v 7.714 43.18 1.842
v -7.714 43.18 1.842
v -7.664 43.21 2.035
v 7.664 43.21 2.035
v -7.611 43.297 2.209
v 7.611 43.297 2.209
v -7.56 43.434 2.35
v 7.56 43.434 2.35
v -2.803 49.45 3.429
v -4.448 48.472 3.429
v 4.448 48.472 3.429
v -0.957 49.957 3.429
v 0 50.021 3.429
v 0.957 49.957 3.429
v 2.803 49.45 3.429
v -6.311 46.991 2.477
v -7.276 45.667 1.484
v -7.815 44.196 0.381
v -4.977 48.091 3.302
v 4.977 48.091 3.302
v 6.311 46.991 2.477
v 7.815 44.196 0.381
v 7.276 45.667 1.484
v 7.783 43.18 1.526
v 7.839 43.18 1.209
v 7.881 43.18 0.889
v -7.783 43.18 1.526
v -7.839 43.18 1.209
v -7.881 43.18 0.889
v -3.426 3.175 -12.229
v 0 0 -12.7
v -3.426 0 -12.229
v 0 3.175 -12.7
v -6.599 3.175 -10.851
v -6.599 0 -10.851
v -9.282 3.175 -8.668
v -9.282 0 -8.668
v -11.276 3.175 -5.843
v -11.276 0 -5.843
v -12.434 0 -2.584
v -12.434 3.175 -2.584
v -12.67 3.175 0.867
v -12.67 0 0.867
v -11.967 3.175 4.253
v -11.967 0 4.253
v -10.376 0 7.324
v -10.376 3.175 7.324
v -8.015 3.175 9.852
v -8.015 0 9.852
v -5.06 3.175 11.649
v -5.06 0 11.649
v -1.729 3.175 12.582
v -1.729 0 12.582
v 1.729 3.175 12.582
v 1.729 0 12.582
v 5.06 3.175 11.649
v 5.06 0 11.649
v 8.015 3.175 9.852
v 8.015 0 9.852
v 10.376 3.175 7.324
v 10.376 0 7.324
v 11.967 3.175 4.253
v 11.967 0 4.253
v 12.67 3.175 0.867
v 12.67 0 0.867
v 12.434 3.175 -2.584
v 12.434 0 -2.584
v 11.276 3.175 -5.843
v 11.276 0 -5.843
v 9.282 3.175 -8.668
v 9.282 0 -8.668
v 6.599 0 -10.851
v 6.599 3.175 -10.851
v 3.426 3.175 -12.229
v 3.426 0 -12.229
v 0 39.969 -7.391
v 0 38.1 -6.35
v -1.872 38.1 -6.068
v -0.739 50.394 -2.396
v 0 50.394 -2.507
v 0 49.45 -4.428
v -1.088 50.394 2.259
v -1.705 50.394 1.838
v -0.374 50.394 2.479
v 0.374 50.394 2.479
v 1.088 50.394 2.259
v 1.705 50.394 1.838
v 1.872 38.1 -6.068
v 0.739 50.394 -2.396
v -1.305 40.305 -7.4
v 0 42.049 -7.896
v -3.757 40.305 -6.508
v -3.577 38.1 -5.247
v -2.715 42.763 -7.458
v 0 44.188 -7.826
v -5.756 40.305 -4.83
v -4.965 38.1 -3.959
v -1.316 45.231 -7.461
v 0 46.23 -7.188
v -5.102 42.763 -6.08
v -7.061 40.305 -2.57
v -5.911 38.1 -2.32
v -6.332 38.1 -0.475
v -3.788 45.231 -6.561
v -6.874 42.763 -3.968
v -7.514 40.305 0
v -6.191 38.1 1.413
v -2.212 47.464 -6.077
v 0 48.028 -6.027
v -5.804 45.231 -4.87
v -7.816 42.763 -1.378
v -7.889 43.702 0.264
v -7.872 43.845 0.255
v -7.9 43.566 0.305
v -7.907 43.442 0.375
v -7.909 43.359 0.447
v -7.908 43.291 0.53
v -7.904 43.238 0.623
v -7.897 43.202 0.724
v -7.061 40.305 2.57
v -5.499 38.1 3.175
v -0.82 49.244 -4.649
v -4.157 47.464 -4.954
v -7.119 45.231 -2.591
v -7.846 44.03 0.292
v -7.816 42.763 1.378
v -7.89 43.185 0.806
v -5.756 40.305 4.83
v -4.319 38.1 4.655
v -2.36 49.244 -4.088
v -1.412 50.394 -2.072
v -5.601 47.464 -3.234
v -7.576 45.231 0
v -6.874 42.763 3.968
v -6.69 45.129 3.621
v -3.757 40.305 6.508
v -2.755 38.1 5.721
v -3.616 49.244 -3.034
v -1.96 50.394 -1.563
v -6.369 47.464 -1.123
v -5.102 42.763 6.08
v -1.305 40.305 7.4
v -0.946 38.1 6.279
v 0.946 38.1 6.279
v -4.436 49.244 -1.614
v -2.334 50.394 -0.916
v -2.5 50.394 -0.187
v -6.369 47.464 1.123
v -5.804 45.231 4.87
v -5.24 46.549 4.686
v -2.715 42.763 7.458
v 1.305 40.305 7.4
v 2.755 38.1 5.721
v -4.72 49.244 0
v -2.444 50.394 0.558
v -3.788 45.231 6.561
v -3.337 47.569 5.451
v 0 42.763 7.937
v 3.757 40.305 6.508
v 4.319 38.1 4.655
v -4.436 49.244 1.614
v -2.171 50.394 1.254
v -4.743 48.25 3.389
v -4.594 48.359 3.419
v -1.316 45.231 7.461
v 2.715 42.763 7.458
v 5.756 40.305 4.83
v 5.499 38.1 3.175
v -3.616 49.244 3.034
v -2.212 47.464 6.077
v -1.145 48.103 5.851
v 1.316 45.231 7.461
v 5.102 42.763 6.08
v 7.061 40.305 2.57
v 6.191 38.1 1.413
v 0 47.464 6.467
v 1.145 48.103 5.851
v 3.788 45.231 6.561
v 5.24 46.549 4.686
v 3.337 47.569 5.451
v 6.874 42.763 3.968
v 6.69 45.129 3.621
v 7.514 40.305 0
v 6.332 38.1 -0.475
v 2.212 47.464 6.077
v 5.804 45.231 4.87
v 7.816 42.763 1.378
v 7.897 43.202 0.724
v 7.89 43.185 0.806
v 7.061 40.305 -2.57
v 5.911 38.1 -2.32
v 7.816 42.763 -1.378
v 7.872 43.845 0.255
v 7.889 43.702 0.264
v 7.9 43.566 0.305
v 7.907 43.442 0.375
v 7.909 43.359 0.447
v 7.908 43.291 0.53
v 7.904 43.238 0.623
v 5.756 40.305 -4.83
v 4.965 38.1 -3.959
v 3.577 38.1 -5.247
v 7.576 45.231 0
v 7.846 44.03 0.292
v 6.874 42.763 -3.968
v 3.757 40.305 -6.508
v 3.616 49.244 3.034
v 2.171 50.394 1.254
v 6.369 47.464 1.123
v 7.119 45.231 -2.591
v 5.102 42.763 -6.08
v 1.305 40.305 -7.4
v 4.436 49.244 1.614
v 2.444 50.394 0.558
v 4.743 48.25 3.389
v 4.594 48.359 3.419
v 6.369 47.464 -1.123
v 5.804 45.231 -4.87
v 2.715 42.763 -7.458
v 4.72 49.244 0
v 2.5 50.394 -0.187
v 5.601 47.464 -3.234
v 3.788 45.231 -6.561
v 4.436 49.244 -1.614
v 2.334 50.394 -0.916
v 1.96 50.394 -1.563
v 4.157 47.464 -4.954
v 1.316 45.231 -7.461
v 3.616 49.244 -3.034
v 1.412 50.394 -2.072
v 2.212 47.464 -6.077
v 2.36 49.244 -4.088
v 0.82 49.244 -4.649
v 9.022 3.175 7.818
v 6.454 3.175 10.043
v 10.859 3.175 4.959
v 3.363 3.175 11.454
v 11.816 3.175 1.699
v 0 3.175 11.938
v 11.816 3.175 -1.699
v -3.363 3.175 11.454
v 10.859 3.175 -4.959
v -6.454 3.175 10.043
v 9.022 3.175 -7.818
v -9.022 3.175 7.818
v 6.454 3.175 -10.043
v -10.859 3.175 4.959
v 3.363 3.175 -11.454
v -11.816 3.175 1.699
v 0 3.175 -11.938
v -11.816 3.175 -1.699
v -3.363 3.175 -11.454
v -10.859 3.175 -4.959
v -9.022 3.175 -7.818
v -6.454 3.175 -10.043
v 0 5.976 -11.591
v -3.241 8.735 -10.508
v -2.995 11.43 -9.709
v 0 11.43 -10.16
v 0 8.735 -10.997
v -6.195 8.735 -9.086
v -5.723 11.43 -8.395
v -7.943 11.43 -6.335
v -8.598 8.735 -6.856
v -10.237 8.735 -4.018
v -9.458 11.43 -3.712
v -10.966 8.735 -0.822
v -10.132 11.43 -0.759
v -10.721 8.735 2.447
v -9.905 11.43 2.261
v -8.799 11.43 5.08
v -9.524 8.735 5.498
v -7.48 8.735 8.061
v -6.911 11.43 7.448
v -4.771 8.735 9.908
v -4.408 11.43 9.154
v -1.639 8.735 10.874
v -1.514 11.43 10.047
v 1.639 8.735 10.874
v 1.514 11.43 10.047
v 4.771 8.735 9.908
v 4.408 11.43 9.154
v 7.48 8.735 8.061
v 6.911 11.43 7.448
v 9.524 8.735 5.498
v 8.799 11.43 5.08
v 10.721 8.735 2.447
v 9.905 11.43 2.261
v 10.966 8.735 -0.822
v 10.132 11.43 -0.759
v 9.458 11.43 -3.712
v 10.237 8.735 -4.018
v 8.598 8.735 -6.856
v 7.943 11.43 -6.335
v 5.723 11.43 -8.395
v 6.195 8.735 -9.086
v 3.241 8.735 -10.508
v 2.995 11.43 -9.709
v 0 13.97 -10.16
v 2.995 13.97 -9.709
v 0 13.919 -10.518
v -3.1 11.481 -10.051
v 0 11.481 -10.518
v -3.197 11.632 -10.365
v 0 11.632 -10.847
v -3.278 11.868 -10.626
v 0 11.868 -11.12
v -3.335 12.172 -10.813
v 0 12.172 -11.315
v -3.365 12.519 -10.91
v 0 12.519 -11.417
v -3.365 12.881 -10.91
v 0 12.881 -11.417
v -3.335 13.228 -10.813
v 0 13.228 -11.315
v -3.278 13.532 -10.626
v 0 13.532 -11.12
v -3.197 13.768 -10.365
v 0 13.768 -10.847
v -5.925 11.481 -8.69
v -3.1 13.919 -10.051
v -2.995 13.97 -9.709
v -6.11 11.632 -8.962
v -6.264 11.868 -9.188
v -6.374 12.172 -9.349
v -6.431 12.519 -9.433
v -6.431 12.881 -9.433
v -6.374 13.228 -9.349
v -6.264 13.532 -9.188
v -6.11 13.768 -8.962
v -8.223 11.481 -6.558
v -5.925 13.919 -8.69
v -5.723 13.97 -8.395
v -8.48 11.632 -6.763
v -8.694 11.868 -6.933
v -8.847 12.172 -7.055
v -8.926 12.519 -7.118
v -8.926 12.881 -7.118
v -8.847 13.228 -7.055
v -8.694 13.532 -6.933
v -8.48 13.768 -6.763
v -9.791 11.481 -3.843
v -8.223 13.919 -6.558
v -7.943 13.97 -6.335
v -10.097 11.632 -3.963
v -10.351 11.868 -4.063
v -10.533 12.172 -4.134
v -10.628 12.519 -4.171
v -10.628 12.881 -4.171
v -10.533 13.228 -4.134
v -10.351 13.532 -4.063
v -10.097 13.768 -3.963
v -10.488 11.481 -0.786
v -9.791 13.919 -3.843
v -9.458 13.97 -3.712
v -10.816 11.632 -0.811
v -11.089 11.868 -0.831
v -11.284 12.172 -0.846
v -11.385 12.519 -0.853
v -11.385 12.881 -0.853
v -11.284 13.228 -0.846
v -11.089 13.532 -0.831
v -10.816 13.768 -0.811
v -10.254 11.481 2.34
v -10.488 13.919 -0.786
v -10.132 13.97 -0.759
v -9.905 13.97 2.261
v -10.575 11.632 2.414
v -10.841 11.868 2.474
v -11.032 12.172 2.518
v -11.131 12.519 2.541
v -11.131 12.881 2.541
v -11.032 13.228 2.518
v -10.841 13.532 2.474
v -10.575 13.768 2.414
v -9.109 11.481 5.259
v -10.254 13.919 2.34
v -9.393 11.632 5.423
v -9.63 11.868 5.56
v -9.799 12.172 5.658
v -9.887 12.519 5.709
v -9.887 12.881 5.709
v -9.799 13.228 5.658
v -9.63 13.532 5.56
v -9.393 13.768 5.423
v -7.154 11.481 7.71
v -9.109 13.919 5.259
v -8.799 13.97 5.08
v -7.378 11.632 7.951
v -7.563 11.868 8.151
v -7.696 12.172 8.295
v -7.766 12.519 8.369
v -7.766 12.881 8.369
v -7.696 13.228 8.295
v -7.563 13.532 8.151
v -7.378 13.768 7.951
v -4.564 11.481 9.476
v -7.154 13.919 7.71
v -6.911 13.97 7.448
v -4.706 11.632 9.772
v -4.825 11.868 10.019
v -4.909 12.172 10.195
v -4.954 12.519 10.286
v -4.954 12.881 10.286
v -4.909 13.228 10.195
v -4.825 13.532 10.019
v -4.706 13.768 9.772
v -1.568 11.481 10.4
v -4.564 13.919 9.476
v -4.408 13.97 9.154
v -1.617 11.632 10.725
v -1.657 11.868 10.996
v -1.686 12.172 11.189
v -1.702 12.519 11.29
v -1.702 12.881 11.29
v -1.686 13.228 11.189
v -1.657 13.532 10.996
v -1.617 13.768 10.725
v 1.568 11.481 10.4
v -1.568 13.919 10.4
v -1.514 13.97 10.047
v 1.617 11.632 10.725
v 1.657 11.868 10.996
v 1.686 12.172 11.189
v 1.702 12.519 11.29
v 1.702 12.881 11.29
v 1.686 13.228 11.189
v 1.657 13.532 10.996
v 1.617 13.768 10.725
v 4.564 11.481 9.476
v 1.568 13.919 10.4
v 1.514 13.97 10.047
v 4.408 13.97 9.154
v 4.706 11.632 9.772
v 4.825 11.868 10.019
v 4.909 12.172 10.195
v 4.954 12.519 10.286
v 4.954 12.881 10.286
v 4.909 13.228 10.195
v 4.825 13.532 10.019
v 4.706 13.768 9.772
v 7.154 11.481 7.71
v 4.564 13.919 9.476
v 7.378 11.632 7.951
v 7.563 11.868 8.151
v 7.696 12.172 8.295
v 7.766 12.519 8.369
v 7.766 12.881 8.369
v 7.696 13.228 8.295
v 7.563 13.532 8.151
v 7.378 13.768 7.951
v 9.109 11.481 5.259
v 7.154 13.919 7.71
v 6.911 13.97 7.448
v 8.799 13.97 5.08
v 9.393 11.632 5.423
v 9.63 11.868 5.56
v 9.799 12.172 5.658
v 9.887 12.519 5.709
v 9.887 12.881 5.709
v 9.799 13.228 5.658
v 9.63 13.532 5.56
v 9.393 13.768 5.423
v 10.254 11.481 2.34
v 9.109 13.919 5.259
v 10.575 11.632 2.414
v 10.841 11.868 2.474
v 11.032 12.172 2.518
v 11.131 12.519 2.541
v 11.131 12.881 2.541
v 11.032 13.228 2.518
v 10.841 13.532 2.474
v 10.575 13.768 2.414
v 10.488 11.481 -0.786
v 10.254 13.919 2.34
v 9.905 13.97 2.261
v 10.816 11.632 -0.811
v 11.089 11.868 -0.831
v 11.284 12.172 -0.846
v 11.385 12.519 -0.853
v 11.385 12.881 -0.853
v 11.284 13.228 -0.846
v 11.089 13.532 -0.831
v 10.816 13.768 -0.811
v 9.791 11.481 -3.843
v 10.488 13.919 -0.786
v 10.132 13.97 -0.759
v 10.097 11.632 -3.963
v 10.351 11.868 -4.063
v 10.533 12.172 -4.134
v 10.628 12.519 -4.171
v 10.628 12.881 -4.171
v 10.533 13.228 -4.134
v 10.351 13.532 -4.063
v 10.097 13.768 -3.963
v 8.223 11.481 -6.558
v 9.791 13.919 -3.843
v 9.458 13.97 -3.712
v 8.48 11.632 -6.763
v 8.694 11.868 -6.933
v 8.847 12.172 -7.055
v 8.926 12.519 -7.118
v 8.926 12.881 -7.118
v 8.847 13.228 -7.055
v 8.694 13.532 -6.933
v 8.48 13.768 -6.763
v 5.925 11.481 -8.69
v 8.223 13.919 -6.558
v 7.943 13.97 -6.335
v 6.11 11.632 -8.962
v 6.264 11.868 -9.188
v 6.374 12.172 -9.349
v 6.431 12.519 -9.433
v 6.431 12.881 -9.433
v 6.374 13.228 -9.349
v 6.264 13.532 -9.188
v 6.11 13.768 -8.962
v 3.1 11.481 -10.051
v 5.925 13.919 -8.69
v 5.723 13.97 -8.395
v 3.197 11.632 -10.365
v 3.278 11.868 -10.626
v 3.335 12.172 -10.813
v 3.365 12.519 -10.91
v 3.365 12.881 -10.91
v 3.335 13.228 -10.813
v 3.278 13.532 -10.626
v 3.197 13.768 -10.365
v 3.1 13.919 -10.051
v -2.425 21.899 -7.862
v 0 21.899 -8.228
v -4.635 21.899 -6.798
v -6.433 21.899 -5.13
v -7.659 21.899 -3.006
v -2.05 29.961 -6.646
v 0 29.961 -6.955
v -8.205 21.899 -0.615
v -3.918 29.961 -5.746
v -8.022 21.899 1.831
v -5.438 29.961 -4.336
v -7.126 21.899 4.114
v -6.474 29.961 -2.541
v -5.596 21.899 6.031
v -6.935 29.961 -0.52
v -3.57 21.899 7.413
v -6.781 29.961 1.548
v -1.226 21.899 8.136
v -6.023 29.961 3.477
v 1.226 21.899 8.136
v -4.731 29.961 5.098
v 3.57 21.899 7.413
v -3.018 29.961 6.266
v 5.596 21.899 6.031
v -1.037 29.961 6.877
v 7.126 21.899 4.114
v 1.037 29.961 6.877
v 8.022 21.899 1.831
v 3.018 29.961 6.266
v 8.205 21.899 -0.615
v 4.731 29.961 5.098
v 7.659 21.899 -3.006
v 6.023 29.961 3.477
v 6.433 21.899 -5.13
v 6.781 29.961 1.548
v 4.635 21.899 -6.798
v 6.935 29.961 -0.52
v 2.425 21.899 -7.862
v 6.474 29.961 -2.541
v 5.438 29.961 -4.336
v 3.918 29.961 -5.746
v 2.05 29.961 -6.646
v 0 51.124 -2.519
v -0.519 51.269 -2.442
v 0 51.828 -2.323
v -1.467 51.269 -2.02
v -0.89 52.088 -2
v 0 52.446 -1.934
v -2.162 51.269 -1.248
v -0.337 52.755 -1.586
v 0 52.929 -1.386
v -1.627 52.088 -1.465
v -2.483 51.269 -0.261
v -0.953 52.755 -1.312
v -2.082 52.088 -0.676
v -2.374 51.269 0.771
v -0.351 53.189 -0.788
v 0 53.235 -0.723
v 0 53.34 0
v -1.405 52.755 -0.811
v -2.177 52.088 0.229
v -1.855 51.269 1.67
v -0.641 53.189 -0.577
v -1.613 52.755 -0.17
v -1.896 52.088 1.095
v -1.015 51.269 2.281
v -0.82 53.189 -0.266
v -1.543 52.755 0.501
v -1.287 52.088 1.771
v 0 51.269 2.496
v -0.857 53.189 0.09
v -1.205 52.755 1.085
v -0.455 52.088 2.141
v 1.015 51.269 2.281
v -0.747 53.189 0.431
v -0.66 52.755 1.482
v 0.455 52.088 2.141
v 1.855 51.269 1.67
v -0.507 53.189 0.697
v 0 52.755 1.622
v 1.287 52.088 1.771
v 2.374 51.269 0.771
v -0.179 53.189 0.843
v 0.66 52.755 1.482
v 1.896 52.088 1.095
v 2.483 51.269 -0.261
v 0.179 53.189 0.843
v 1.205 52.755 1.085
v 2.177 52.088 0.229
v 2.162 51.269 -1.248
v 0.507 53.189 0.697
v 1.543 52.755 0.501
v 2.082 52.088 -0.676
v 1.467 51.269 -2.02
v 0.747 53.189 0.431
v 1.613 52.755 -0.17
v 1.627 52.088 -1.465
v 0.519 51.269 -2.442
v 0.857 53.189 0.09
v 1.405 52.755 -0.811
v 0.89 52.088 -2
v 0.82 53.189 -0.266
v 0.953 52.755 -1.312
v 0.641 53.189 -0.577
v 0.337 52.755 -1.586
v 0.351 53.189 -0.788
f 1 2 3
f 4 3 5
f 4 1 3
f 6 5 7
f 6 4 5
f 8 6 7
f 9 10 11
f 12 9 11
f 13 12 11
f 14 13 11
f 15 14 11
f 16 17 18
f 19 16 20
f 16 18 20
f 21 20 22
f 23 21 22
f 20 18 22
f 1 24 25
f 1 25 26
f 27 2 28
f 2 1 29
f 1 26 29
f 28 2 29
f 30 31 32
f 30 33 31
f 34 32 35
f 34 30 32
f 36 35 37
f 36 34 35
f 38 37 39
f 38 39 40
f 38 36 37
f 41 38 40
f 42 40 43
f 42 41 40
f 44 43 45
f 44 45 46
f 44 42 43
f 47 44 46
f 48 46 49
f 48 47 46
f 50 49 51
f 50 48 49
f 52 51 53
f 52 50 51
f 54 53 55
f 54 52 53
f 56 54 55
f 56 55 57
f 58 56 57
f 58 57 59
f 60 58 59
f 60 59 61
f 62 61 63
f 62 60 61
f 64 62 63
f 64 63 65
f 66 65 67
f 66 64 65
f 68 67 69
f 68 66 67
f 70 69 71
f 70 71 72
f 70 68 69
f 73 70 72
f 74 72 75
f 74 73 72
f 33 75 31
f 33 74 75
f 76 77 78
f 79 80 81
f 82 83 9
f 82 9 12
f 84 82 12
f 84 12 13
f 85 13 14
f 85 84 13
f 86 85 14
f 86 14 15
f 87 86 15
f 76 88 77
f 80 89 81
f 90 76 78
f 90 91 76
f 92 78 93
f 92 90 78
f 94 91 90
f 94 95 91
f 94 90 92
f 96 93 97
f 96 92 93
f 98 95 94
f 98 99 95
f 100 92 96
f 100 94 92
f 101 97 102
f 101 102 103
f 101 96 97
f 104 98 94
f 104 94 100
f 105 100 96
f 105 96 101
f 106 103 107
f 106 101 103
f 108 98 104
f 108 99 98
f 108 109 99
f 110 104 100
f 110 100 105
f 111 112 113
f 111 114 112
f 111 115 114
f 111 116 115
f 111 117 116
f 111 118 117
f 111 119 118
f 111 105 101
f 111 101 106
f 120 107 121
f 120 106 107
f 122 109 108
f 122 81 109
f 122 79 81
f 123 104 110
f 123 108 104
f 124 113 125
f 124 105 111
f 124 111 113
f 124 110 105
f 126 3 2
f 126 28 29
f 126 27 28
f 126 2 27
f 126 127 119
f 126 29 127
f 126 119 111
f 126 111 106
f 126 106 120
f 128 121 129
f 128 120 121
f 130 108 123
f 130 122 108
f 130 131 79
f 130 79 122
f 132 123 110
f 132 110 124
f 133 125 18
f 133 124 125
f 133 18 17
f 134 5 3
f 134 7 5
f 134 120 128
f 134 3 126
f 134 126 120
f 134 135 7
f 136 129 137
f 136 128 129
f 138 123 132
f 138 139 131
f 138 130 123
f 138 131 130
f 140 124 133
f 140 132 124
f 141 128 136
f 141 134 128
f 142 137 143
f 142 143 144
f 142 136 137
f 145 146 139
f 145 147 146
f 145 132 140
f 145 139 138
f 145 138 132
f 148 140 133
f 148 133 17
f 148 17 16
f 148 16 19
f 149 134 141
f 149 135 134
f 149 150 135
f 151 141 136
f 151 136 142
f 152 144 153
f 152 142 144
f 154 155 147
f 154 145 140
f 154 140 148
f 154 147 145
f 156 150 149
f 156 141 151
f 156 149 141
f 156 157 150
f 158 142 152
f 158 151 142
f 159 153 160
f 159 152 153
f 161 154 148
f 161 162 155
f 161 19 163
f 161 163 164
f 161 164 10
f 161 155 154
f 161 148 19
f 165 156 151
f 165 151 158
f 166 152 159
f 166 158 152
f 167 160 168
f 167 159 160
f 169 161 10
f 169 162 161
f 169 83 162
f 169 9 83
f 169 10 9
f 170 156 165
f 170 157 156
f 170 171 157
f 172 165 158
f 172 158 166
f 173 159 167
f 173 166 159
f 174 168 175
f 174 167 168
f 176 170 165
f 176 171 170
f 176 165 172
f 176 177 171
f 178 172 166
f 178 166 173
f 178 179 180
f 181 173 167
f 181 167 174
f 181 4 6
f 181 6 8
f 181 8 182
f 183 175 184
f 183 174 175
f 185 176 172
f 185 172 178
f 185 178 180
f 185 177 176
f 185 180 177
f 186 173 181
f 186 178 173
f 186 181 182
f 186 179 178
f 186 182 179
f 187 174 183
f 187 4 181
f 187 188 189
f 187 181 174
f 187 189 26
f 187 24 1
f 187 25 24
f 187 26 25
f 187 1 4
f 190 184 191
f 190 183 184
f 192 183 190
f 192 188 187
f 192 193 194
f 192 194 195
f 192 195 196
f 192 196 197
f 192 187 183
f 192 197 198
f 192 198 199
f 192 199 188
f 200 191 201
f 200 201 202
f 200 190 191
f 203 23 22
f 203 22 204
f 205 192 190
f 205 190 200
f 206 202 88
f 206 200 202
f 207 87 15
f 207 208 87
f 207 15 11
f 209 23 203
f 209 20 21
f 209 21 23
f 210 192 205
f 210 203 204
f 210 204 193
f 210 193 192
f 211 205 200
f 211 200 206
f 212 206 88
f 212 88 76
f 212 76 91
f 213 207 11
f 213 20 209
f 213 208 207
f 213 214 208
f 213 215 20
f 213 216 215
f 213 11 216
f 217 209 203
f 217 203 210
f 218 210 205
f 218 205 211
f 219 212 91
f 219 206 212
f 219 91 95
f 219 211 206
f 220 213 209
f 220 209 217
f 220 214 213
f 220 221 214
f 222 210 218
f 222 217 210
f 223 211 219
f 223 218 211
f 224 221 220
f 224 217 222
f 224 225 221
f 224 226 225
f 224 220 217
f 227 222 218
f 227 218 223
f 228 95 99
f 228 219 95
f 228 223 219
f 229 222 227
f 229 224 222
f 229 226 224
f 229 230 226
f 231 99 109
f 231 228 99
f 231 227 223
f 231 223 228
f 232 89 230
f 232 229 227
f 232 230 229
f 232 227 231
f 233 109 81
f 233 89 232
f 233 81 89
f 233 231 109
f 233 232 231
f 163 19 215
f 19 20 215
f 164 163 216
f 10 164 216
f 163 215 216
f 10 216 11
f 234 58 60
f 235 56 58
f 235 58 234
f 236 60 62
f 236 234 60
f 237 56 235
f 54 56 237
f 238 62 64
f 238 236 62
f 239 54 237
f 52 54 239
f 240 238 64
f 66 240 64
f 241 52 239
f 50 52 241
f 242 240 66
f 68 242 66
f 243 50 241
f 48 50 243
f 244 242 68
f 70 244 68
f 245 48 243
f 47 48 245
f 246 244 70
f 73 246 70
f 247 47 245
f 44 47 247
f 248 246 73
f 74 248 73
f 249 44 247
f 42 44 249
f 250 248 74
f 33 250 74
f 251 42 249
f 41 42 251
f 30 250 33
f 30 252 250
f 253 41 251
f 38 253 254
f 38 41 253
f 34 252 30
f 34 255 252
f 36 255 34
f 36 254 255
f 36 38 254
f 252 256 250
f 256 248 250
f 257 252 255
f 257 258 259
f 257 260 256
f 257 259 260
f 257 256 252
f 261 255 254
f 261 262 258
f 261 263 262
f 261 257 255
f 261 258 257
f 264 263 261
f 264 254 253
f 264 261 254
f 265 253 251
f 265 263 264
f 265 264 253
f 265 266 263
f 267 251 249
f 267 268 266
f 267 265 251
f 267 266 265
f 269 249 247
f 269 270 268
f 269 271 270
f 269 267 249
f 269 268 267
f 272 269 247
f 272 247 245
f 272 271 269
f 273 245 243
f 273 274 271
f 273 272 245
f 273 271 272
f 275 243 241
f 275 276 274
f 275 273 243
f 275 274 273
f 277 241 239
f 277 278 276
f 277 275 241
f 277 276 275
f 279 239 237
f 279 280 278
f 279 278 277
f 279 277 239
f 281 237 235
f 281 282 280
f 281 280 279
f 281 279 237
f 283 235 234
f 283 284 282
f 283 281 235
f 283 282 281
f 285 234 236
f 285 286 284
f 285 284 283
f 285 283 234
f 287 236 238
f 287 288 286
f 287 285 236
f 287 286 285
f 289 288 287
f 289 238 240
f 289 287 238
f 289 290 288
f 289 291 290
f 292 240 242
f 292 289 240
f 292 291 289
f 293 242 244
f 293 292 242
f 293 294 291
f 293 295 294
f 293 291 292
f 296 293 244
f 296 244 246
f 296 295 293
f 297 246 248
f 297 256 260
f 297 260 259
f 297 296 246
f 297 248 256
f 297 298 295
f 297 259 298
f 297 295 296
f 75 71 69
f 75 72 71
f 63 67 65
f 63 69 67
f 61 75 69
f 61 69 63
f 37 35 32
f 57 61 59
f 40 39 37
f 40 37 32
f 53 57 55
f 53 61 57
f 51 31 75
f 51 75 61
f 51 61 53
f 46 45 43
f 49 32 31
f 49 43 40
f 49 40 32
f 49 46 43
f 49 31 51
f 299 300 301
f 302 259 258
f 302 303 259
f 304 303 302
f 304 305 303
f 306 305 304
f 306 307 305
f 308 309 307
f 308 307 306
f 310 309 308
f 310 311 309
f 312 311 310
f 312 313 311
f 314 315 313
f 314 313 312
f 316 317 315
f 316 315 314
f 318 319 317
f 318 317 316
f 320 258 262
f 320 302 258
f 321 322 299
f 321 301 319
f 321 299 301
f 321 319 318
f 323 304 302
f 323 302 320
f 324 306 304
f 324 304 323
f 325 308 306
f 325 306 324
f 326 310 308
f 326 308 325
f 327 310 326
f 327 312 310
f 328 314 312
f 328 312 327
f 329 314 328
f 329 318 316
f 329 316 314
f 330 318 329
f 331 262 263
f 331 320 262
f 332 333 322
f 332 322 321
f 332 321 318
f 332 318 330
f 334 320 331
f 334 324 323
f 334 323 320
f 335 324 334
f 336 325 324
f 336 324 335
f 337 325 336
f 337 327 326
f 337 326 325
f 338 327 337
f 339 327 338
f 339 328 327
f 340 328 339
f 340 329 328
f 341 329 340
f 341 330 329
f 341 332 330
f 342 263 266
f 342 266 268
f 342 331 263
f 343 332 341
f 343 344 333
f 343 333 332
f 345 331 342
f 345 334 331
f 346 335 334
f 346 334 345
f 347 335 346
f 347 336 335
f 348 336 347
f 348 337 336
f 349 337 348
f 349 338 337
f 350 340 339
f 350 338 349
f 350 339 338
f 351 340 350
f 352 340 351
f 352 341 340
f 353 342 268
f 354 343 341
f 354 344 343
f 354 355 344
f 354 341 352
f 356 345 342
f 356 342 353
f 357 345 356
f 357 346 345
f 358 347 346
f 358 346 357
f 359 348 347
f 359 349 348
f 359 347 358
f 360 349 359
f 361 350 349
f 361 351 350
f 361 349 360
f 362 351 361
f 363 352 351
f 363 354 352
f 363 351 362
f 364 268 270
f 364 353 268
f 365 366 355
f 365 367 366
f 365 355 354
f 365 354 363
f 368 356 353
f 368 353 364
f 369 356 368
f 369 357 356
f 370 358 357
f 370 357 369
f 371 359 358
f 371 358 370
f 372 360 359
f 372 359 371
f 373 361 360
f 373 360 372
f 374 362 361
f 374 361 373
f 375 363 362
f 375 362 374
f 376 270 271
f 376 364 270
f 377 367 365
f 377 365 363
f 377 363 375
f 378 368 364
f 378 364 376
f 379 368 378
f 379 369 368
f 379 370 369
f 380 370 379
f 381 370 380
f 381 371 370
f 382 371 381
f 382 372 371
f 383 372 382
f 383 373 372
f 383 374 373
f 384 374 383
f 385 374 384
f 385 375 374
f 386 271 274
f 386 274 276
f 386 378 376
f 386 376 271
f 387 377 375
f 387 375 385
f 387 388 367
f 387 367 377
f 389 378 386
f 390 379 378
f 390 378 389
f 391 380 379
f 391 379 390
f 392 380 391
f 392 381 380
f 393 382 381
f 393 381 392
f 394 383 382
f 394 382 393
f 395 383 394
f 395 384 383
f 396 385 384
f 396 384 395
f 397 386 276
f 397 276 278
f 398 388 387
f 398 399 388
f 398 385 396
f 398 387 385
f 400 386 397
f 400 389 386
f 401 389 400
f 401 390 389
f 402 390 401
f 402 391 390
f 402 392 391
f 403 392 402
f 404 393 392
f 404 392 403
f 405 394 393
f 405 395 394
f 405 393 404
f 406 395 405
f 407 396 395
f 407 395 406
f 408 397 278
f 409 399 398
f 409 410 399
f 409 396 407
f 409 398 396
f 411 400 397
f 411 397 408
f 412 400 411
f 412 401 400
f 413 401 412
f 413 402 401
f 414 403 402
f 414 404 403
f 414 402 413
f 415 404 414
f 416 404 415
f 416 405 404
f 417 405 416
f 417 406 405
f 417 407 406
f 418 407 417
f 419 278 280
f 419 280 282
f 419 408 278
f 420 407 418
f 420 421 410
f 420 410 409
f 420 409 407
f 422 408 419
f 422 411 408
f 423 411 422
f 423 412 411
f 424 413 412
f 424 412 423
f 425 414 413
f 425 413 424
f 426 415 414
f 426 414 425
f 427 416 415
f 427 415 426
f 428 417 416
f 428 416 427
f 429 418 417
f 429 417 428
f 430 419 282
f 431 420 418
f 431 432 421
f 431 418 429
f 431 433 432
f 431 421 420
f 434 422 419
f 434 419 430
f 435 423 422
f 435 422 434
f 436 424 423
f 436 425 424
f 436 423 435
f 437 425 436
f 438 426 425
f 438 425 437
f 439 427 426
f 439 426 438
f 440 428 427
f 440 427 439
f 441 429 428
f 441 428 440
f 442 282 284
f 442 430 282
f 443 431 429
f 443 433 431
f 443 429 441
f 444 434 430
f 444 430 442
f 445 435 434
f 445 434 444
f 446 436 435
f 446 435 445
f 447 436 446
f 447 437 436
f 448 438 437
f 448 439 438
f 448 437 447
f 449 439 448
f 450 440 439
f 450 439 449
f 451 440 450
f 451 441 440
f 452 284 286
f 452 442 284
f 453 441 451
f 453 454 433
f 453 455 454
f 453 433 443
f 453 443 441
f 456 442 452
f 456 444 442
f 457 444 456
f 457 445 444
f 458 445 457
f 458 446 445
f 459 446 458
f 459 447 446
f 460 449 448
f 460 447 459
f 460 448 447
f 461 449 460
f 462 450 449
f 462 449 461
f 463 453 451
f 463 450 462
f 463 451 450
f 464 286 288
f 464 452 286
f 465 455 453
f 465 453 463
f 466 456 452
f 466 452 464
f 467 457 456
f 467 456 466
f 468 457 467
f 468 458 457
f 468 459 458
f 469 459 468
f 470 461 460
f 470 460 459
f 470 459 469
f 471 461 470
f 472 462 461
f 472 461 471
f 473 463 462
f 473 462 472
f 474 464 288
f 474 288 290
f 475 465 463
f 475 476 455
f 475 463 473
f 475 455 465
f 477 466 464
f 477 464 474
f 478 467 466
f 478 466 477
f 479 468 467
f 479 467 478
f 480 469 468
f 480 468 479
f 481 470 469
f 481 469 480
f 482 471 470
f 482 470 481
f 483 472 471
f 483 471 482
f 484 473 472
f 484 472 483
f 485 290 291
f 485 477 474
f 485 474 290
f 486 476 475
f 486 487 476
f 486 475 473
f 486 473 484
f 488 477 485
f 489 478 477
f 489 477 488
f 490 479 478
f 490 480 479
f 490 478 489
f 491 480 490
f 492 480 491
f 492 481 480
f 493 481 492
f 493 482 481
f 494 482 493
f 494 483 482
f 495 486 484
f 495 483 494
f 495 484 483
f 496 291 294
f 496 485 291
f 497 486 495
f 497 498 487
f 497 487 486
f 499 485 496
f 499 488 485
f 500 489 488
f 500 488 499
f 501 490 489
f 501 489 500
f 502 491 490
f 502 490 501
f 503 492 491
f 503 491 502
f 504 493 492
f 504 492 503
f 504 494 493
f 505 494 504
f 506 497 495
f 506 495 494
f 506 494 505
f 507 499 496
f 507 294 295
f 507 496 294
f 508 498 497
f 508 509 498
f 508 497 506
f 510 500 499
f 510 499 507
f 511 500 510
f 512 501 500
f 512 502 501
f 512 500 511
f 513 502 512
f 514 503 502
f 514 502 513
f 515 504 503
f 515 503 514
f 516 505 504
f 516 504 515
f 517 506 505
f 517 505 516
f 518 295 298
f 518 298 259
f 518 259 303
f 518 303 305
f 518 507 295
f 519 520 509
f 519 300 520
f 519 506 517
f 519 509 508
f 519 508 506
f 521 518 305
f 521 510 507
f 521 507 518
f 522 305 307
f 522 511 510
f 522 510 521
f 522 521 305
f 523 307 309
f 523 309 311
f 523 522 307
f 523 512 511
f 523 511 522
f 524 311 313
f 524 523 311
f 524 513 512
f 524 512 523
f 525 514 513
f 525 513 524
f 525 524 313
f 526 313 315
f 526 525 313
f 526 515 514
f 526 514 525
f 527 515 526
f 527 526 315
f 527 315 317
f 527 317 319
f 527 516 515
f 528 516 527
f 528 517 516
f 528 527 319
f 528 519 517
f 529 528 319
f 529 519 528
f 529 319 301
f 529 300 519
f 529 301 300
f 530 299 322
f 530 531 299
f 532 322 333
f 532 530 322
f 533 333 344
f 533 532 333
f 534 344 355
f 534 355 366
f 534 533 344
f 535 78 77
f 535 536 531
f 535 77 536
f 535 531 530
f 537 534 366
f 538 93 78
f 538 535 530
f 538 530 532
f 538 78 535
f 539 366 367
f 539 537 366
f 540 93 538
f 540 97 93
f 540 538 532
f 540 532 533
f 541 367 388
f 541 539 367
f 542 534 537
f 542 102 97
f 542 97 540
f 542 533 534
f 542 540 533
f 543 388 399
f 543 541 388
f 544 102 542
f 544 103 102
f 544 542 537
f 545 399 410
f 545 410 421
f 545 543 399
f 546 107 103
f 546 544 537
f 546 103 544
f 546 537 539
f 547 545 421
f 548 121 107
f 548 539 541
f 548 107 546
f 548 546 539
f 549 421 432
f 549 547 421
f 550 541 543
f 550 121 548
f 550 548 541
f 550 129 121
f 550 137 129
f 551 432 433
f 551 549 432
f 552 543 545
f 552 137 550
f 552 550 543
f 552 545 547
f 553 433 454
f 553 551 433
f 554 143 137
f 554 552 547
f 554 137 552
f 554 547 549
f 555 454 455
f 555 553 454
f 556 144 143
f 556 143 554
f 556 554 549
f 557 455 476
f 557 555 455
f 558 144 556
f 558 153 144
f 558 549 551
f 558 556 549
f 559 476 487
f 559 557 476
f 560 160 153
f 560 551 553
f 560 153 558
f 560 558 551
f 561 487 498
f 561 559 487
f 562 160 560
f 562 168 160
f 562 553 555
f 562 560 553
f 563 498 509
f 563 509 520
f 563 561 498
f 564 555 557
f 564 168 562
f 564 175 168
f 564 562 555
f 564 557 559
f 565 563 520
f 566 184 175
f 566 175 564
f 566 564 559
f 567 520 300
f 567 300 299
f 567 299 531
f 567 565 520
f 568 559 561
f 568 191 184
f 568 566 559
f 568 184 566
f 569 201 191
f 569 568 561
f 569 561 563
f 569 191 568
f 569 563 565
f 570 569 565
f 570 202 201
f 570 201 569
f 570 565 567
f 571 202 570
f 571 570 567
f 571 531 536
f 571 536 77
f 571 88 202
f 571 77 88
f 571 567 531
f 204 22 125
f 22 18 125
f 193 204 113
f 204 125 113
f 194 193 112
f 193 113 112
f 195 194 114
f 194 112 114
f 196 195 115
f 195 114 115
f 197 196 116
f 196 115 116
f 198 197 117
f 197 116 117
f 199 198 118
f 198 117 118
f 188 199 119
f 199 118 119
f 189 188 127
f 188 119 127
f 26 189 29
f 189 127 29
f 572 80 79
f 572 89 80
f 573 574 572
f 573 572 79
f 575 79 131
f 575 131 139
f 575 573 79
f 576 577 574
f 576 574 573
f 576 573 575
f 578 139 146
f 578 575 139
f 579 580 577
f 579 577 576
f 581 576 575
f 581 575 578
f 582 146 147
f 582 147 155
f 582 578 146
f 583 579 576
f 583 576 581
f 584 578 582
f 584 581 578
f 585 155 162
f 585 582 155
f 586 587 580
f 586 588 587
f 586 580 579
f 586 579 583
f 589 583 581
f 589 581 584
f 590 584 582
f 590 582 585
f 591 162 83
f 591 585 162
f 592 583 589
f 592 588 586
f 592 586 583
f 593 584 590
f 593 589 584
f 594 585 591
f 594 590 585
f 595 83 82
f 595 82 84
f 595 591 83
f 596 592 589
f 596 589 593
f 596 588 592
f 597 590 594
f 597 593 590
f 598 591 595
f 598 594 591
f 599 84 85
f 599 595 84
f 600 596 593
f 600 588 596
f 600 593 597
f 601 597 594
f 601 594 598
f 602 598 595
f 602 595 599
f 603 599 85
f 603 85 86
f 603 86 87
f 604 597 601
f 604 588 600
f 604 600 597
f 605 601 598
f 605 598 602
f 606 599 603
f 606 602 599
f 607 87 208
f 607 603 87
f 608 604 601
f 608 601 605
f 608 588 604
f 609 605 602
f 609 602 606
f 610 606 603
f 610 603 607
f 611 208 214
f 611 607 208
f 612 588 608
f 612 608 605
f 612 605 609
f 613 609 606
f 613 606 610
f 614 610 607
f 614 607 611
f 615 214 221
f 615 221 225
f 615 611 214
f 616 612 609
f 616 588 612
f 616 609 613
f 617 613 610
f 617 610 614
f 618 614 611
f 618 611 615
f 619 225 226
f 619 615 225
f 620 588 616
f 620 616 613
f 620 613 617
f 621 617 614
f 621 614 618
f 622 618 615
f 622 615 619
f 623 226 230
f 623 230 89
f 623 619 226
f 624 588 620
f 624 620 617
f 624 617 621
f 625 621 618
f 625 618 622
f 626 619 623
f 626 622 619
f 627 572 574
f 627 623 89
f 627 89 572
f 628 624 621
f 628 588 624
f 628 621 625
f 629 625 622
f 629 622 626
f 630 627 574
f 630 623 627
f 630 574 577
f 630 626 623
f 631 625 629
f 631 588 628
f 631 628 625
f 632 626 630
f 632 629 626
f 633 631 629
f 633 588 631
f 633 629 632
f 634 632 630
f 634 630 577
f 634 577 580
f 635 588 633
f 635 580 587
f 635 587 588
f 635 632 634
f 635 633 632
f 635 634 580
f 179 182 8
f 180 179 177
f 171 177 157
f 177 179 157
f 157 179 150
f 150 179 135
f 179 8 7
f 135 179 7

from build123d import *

# Parameters (mm, degrees)
SKETCH4_2_W        = 17.78
SKETCH4_2_H        = 2.54
CUT_EXTRUDE4_DEPTH = 10.795
FILLET1_R          = 0.635


with BuildPart() as part:
    # Sketch1 → Revolve1 (revolve)
    with BuildSketch(Plane.XY, mode=Mode.PRIVATE) as revolve1_sk:
        with BuildLine():
            Line((0, 0), (12.7, 0))
            Line((12.7, 0), (12.7, 3.175))
            Line((12.7, 3.175), (11.938, 3.175))
            ThreePointArc((11.938, 3.175), (11.324664102, 7.361873807), (10.16, 11.43))
            ThreePointArc((10.16, 11.43), (11.43, 12.7), (10.16, 13.97))
            ThreePointArc((10.16, 13.97), (7.508321203, 25.917103348), (6.35, 38.1))
            ThreePointArc((6.35, 38.1), (7.576014134, 45.230603901), (2.507277216, 50.3936))
            ThreePointArc((2.507277216, 50.3936), (1.934406369, 52.446108137), (0, 53.34))
            Line((0, 53.34), (0, 50.8))
            Line((0, 50.8), (0, 0))
        make_face()
    revolve(revolve1_sk.sketch.rotate(Axis((0, 0, 0), (0, 1, 0)), 90), axis=Axis((0, 0, 0), (0, 1, 0)))

    # Sketch4 → Cut-Loft1 section 0
    with BuildSketch(Plane(origin=(0, 48.26, 0), x_dir=(1, 0, 0), z_dir=(0, 1, 0))):
        with BuildLine():
            Line((-8.89, -3.429), (8.89, -3.429))
            Line((8.89, -3.429), (8.89, -5.969))
            Line((8.89, -5.969), (-8.89, -5.969))
            Line((-8.89, -5.969), (-8.89, -3.429))
        make_face()
    # Sketch6 → Cut-Loft1 section 1
    with BuildSketch(Plane(origin=(0, 43.18, 0), x_dir=(1, 0, 0), z_dir=(0, 1, 0))):
        with BuildLine():
            Line((-8.89, -2.159), (8.89, -2.159))
            Line((8.89, -2.159), (8.89, 0.381))
            Line((8.89, 0.381), (-8.89, 0.381))
            Line((-8.89, 0.381), (-8.89, -2.159))
        make_face()
    loft(mode=Mode.SUBTRACT)

    # Sketch4<2> → Cut-Extrude4 (cut)
    with BuildSketch(Plane(origin=(0, 48.26, 0), x_dir=(1, 0, 0), z_dir=(0, 1, 0))):
        with Locations((0, -4.699)):
            Rectangle(SKETCH4_2_W, SKETCH4_2_H)
    extrude(amount=CUT_EXTRUDE4_DEPTH, mode=Mode.SUBTRACT)

    # Fillet1
    fillet1_edges = [part.edges().sort_by_distance(p)[0] for p in [
        (0, 43.18, 2.159),
        (0, 48.26, 3.429),
        (0, 43.18, -0.381),
    ]]
    fillet(fillet1_edges, radius=FILLET1_R)


solid = part.part
